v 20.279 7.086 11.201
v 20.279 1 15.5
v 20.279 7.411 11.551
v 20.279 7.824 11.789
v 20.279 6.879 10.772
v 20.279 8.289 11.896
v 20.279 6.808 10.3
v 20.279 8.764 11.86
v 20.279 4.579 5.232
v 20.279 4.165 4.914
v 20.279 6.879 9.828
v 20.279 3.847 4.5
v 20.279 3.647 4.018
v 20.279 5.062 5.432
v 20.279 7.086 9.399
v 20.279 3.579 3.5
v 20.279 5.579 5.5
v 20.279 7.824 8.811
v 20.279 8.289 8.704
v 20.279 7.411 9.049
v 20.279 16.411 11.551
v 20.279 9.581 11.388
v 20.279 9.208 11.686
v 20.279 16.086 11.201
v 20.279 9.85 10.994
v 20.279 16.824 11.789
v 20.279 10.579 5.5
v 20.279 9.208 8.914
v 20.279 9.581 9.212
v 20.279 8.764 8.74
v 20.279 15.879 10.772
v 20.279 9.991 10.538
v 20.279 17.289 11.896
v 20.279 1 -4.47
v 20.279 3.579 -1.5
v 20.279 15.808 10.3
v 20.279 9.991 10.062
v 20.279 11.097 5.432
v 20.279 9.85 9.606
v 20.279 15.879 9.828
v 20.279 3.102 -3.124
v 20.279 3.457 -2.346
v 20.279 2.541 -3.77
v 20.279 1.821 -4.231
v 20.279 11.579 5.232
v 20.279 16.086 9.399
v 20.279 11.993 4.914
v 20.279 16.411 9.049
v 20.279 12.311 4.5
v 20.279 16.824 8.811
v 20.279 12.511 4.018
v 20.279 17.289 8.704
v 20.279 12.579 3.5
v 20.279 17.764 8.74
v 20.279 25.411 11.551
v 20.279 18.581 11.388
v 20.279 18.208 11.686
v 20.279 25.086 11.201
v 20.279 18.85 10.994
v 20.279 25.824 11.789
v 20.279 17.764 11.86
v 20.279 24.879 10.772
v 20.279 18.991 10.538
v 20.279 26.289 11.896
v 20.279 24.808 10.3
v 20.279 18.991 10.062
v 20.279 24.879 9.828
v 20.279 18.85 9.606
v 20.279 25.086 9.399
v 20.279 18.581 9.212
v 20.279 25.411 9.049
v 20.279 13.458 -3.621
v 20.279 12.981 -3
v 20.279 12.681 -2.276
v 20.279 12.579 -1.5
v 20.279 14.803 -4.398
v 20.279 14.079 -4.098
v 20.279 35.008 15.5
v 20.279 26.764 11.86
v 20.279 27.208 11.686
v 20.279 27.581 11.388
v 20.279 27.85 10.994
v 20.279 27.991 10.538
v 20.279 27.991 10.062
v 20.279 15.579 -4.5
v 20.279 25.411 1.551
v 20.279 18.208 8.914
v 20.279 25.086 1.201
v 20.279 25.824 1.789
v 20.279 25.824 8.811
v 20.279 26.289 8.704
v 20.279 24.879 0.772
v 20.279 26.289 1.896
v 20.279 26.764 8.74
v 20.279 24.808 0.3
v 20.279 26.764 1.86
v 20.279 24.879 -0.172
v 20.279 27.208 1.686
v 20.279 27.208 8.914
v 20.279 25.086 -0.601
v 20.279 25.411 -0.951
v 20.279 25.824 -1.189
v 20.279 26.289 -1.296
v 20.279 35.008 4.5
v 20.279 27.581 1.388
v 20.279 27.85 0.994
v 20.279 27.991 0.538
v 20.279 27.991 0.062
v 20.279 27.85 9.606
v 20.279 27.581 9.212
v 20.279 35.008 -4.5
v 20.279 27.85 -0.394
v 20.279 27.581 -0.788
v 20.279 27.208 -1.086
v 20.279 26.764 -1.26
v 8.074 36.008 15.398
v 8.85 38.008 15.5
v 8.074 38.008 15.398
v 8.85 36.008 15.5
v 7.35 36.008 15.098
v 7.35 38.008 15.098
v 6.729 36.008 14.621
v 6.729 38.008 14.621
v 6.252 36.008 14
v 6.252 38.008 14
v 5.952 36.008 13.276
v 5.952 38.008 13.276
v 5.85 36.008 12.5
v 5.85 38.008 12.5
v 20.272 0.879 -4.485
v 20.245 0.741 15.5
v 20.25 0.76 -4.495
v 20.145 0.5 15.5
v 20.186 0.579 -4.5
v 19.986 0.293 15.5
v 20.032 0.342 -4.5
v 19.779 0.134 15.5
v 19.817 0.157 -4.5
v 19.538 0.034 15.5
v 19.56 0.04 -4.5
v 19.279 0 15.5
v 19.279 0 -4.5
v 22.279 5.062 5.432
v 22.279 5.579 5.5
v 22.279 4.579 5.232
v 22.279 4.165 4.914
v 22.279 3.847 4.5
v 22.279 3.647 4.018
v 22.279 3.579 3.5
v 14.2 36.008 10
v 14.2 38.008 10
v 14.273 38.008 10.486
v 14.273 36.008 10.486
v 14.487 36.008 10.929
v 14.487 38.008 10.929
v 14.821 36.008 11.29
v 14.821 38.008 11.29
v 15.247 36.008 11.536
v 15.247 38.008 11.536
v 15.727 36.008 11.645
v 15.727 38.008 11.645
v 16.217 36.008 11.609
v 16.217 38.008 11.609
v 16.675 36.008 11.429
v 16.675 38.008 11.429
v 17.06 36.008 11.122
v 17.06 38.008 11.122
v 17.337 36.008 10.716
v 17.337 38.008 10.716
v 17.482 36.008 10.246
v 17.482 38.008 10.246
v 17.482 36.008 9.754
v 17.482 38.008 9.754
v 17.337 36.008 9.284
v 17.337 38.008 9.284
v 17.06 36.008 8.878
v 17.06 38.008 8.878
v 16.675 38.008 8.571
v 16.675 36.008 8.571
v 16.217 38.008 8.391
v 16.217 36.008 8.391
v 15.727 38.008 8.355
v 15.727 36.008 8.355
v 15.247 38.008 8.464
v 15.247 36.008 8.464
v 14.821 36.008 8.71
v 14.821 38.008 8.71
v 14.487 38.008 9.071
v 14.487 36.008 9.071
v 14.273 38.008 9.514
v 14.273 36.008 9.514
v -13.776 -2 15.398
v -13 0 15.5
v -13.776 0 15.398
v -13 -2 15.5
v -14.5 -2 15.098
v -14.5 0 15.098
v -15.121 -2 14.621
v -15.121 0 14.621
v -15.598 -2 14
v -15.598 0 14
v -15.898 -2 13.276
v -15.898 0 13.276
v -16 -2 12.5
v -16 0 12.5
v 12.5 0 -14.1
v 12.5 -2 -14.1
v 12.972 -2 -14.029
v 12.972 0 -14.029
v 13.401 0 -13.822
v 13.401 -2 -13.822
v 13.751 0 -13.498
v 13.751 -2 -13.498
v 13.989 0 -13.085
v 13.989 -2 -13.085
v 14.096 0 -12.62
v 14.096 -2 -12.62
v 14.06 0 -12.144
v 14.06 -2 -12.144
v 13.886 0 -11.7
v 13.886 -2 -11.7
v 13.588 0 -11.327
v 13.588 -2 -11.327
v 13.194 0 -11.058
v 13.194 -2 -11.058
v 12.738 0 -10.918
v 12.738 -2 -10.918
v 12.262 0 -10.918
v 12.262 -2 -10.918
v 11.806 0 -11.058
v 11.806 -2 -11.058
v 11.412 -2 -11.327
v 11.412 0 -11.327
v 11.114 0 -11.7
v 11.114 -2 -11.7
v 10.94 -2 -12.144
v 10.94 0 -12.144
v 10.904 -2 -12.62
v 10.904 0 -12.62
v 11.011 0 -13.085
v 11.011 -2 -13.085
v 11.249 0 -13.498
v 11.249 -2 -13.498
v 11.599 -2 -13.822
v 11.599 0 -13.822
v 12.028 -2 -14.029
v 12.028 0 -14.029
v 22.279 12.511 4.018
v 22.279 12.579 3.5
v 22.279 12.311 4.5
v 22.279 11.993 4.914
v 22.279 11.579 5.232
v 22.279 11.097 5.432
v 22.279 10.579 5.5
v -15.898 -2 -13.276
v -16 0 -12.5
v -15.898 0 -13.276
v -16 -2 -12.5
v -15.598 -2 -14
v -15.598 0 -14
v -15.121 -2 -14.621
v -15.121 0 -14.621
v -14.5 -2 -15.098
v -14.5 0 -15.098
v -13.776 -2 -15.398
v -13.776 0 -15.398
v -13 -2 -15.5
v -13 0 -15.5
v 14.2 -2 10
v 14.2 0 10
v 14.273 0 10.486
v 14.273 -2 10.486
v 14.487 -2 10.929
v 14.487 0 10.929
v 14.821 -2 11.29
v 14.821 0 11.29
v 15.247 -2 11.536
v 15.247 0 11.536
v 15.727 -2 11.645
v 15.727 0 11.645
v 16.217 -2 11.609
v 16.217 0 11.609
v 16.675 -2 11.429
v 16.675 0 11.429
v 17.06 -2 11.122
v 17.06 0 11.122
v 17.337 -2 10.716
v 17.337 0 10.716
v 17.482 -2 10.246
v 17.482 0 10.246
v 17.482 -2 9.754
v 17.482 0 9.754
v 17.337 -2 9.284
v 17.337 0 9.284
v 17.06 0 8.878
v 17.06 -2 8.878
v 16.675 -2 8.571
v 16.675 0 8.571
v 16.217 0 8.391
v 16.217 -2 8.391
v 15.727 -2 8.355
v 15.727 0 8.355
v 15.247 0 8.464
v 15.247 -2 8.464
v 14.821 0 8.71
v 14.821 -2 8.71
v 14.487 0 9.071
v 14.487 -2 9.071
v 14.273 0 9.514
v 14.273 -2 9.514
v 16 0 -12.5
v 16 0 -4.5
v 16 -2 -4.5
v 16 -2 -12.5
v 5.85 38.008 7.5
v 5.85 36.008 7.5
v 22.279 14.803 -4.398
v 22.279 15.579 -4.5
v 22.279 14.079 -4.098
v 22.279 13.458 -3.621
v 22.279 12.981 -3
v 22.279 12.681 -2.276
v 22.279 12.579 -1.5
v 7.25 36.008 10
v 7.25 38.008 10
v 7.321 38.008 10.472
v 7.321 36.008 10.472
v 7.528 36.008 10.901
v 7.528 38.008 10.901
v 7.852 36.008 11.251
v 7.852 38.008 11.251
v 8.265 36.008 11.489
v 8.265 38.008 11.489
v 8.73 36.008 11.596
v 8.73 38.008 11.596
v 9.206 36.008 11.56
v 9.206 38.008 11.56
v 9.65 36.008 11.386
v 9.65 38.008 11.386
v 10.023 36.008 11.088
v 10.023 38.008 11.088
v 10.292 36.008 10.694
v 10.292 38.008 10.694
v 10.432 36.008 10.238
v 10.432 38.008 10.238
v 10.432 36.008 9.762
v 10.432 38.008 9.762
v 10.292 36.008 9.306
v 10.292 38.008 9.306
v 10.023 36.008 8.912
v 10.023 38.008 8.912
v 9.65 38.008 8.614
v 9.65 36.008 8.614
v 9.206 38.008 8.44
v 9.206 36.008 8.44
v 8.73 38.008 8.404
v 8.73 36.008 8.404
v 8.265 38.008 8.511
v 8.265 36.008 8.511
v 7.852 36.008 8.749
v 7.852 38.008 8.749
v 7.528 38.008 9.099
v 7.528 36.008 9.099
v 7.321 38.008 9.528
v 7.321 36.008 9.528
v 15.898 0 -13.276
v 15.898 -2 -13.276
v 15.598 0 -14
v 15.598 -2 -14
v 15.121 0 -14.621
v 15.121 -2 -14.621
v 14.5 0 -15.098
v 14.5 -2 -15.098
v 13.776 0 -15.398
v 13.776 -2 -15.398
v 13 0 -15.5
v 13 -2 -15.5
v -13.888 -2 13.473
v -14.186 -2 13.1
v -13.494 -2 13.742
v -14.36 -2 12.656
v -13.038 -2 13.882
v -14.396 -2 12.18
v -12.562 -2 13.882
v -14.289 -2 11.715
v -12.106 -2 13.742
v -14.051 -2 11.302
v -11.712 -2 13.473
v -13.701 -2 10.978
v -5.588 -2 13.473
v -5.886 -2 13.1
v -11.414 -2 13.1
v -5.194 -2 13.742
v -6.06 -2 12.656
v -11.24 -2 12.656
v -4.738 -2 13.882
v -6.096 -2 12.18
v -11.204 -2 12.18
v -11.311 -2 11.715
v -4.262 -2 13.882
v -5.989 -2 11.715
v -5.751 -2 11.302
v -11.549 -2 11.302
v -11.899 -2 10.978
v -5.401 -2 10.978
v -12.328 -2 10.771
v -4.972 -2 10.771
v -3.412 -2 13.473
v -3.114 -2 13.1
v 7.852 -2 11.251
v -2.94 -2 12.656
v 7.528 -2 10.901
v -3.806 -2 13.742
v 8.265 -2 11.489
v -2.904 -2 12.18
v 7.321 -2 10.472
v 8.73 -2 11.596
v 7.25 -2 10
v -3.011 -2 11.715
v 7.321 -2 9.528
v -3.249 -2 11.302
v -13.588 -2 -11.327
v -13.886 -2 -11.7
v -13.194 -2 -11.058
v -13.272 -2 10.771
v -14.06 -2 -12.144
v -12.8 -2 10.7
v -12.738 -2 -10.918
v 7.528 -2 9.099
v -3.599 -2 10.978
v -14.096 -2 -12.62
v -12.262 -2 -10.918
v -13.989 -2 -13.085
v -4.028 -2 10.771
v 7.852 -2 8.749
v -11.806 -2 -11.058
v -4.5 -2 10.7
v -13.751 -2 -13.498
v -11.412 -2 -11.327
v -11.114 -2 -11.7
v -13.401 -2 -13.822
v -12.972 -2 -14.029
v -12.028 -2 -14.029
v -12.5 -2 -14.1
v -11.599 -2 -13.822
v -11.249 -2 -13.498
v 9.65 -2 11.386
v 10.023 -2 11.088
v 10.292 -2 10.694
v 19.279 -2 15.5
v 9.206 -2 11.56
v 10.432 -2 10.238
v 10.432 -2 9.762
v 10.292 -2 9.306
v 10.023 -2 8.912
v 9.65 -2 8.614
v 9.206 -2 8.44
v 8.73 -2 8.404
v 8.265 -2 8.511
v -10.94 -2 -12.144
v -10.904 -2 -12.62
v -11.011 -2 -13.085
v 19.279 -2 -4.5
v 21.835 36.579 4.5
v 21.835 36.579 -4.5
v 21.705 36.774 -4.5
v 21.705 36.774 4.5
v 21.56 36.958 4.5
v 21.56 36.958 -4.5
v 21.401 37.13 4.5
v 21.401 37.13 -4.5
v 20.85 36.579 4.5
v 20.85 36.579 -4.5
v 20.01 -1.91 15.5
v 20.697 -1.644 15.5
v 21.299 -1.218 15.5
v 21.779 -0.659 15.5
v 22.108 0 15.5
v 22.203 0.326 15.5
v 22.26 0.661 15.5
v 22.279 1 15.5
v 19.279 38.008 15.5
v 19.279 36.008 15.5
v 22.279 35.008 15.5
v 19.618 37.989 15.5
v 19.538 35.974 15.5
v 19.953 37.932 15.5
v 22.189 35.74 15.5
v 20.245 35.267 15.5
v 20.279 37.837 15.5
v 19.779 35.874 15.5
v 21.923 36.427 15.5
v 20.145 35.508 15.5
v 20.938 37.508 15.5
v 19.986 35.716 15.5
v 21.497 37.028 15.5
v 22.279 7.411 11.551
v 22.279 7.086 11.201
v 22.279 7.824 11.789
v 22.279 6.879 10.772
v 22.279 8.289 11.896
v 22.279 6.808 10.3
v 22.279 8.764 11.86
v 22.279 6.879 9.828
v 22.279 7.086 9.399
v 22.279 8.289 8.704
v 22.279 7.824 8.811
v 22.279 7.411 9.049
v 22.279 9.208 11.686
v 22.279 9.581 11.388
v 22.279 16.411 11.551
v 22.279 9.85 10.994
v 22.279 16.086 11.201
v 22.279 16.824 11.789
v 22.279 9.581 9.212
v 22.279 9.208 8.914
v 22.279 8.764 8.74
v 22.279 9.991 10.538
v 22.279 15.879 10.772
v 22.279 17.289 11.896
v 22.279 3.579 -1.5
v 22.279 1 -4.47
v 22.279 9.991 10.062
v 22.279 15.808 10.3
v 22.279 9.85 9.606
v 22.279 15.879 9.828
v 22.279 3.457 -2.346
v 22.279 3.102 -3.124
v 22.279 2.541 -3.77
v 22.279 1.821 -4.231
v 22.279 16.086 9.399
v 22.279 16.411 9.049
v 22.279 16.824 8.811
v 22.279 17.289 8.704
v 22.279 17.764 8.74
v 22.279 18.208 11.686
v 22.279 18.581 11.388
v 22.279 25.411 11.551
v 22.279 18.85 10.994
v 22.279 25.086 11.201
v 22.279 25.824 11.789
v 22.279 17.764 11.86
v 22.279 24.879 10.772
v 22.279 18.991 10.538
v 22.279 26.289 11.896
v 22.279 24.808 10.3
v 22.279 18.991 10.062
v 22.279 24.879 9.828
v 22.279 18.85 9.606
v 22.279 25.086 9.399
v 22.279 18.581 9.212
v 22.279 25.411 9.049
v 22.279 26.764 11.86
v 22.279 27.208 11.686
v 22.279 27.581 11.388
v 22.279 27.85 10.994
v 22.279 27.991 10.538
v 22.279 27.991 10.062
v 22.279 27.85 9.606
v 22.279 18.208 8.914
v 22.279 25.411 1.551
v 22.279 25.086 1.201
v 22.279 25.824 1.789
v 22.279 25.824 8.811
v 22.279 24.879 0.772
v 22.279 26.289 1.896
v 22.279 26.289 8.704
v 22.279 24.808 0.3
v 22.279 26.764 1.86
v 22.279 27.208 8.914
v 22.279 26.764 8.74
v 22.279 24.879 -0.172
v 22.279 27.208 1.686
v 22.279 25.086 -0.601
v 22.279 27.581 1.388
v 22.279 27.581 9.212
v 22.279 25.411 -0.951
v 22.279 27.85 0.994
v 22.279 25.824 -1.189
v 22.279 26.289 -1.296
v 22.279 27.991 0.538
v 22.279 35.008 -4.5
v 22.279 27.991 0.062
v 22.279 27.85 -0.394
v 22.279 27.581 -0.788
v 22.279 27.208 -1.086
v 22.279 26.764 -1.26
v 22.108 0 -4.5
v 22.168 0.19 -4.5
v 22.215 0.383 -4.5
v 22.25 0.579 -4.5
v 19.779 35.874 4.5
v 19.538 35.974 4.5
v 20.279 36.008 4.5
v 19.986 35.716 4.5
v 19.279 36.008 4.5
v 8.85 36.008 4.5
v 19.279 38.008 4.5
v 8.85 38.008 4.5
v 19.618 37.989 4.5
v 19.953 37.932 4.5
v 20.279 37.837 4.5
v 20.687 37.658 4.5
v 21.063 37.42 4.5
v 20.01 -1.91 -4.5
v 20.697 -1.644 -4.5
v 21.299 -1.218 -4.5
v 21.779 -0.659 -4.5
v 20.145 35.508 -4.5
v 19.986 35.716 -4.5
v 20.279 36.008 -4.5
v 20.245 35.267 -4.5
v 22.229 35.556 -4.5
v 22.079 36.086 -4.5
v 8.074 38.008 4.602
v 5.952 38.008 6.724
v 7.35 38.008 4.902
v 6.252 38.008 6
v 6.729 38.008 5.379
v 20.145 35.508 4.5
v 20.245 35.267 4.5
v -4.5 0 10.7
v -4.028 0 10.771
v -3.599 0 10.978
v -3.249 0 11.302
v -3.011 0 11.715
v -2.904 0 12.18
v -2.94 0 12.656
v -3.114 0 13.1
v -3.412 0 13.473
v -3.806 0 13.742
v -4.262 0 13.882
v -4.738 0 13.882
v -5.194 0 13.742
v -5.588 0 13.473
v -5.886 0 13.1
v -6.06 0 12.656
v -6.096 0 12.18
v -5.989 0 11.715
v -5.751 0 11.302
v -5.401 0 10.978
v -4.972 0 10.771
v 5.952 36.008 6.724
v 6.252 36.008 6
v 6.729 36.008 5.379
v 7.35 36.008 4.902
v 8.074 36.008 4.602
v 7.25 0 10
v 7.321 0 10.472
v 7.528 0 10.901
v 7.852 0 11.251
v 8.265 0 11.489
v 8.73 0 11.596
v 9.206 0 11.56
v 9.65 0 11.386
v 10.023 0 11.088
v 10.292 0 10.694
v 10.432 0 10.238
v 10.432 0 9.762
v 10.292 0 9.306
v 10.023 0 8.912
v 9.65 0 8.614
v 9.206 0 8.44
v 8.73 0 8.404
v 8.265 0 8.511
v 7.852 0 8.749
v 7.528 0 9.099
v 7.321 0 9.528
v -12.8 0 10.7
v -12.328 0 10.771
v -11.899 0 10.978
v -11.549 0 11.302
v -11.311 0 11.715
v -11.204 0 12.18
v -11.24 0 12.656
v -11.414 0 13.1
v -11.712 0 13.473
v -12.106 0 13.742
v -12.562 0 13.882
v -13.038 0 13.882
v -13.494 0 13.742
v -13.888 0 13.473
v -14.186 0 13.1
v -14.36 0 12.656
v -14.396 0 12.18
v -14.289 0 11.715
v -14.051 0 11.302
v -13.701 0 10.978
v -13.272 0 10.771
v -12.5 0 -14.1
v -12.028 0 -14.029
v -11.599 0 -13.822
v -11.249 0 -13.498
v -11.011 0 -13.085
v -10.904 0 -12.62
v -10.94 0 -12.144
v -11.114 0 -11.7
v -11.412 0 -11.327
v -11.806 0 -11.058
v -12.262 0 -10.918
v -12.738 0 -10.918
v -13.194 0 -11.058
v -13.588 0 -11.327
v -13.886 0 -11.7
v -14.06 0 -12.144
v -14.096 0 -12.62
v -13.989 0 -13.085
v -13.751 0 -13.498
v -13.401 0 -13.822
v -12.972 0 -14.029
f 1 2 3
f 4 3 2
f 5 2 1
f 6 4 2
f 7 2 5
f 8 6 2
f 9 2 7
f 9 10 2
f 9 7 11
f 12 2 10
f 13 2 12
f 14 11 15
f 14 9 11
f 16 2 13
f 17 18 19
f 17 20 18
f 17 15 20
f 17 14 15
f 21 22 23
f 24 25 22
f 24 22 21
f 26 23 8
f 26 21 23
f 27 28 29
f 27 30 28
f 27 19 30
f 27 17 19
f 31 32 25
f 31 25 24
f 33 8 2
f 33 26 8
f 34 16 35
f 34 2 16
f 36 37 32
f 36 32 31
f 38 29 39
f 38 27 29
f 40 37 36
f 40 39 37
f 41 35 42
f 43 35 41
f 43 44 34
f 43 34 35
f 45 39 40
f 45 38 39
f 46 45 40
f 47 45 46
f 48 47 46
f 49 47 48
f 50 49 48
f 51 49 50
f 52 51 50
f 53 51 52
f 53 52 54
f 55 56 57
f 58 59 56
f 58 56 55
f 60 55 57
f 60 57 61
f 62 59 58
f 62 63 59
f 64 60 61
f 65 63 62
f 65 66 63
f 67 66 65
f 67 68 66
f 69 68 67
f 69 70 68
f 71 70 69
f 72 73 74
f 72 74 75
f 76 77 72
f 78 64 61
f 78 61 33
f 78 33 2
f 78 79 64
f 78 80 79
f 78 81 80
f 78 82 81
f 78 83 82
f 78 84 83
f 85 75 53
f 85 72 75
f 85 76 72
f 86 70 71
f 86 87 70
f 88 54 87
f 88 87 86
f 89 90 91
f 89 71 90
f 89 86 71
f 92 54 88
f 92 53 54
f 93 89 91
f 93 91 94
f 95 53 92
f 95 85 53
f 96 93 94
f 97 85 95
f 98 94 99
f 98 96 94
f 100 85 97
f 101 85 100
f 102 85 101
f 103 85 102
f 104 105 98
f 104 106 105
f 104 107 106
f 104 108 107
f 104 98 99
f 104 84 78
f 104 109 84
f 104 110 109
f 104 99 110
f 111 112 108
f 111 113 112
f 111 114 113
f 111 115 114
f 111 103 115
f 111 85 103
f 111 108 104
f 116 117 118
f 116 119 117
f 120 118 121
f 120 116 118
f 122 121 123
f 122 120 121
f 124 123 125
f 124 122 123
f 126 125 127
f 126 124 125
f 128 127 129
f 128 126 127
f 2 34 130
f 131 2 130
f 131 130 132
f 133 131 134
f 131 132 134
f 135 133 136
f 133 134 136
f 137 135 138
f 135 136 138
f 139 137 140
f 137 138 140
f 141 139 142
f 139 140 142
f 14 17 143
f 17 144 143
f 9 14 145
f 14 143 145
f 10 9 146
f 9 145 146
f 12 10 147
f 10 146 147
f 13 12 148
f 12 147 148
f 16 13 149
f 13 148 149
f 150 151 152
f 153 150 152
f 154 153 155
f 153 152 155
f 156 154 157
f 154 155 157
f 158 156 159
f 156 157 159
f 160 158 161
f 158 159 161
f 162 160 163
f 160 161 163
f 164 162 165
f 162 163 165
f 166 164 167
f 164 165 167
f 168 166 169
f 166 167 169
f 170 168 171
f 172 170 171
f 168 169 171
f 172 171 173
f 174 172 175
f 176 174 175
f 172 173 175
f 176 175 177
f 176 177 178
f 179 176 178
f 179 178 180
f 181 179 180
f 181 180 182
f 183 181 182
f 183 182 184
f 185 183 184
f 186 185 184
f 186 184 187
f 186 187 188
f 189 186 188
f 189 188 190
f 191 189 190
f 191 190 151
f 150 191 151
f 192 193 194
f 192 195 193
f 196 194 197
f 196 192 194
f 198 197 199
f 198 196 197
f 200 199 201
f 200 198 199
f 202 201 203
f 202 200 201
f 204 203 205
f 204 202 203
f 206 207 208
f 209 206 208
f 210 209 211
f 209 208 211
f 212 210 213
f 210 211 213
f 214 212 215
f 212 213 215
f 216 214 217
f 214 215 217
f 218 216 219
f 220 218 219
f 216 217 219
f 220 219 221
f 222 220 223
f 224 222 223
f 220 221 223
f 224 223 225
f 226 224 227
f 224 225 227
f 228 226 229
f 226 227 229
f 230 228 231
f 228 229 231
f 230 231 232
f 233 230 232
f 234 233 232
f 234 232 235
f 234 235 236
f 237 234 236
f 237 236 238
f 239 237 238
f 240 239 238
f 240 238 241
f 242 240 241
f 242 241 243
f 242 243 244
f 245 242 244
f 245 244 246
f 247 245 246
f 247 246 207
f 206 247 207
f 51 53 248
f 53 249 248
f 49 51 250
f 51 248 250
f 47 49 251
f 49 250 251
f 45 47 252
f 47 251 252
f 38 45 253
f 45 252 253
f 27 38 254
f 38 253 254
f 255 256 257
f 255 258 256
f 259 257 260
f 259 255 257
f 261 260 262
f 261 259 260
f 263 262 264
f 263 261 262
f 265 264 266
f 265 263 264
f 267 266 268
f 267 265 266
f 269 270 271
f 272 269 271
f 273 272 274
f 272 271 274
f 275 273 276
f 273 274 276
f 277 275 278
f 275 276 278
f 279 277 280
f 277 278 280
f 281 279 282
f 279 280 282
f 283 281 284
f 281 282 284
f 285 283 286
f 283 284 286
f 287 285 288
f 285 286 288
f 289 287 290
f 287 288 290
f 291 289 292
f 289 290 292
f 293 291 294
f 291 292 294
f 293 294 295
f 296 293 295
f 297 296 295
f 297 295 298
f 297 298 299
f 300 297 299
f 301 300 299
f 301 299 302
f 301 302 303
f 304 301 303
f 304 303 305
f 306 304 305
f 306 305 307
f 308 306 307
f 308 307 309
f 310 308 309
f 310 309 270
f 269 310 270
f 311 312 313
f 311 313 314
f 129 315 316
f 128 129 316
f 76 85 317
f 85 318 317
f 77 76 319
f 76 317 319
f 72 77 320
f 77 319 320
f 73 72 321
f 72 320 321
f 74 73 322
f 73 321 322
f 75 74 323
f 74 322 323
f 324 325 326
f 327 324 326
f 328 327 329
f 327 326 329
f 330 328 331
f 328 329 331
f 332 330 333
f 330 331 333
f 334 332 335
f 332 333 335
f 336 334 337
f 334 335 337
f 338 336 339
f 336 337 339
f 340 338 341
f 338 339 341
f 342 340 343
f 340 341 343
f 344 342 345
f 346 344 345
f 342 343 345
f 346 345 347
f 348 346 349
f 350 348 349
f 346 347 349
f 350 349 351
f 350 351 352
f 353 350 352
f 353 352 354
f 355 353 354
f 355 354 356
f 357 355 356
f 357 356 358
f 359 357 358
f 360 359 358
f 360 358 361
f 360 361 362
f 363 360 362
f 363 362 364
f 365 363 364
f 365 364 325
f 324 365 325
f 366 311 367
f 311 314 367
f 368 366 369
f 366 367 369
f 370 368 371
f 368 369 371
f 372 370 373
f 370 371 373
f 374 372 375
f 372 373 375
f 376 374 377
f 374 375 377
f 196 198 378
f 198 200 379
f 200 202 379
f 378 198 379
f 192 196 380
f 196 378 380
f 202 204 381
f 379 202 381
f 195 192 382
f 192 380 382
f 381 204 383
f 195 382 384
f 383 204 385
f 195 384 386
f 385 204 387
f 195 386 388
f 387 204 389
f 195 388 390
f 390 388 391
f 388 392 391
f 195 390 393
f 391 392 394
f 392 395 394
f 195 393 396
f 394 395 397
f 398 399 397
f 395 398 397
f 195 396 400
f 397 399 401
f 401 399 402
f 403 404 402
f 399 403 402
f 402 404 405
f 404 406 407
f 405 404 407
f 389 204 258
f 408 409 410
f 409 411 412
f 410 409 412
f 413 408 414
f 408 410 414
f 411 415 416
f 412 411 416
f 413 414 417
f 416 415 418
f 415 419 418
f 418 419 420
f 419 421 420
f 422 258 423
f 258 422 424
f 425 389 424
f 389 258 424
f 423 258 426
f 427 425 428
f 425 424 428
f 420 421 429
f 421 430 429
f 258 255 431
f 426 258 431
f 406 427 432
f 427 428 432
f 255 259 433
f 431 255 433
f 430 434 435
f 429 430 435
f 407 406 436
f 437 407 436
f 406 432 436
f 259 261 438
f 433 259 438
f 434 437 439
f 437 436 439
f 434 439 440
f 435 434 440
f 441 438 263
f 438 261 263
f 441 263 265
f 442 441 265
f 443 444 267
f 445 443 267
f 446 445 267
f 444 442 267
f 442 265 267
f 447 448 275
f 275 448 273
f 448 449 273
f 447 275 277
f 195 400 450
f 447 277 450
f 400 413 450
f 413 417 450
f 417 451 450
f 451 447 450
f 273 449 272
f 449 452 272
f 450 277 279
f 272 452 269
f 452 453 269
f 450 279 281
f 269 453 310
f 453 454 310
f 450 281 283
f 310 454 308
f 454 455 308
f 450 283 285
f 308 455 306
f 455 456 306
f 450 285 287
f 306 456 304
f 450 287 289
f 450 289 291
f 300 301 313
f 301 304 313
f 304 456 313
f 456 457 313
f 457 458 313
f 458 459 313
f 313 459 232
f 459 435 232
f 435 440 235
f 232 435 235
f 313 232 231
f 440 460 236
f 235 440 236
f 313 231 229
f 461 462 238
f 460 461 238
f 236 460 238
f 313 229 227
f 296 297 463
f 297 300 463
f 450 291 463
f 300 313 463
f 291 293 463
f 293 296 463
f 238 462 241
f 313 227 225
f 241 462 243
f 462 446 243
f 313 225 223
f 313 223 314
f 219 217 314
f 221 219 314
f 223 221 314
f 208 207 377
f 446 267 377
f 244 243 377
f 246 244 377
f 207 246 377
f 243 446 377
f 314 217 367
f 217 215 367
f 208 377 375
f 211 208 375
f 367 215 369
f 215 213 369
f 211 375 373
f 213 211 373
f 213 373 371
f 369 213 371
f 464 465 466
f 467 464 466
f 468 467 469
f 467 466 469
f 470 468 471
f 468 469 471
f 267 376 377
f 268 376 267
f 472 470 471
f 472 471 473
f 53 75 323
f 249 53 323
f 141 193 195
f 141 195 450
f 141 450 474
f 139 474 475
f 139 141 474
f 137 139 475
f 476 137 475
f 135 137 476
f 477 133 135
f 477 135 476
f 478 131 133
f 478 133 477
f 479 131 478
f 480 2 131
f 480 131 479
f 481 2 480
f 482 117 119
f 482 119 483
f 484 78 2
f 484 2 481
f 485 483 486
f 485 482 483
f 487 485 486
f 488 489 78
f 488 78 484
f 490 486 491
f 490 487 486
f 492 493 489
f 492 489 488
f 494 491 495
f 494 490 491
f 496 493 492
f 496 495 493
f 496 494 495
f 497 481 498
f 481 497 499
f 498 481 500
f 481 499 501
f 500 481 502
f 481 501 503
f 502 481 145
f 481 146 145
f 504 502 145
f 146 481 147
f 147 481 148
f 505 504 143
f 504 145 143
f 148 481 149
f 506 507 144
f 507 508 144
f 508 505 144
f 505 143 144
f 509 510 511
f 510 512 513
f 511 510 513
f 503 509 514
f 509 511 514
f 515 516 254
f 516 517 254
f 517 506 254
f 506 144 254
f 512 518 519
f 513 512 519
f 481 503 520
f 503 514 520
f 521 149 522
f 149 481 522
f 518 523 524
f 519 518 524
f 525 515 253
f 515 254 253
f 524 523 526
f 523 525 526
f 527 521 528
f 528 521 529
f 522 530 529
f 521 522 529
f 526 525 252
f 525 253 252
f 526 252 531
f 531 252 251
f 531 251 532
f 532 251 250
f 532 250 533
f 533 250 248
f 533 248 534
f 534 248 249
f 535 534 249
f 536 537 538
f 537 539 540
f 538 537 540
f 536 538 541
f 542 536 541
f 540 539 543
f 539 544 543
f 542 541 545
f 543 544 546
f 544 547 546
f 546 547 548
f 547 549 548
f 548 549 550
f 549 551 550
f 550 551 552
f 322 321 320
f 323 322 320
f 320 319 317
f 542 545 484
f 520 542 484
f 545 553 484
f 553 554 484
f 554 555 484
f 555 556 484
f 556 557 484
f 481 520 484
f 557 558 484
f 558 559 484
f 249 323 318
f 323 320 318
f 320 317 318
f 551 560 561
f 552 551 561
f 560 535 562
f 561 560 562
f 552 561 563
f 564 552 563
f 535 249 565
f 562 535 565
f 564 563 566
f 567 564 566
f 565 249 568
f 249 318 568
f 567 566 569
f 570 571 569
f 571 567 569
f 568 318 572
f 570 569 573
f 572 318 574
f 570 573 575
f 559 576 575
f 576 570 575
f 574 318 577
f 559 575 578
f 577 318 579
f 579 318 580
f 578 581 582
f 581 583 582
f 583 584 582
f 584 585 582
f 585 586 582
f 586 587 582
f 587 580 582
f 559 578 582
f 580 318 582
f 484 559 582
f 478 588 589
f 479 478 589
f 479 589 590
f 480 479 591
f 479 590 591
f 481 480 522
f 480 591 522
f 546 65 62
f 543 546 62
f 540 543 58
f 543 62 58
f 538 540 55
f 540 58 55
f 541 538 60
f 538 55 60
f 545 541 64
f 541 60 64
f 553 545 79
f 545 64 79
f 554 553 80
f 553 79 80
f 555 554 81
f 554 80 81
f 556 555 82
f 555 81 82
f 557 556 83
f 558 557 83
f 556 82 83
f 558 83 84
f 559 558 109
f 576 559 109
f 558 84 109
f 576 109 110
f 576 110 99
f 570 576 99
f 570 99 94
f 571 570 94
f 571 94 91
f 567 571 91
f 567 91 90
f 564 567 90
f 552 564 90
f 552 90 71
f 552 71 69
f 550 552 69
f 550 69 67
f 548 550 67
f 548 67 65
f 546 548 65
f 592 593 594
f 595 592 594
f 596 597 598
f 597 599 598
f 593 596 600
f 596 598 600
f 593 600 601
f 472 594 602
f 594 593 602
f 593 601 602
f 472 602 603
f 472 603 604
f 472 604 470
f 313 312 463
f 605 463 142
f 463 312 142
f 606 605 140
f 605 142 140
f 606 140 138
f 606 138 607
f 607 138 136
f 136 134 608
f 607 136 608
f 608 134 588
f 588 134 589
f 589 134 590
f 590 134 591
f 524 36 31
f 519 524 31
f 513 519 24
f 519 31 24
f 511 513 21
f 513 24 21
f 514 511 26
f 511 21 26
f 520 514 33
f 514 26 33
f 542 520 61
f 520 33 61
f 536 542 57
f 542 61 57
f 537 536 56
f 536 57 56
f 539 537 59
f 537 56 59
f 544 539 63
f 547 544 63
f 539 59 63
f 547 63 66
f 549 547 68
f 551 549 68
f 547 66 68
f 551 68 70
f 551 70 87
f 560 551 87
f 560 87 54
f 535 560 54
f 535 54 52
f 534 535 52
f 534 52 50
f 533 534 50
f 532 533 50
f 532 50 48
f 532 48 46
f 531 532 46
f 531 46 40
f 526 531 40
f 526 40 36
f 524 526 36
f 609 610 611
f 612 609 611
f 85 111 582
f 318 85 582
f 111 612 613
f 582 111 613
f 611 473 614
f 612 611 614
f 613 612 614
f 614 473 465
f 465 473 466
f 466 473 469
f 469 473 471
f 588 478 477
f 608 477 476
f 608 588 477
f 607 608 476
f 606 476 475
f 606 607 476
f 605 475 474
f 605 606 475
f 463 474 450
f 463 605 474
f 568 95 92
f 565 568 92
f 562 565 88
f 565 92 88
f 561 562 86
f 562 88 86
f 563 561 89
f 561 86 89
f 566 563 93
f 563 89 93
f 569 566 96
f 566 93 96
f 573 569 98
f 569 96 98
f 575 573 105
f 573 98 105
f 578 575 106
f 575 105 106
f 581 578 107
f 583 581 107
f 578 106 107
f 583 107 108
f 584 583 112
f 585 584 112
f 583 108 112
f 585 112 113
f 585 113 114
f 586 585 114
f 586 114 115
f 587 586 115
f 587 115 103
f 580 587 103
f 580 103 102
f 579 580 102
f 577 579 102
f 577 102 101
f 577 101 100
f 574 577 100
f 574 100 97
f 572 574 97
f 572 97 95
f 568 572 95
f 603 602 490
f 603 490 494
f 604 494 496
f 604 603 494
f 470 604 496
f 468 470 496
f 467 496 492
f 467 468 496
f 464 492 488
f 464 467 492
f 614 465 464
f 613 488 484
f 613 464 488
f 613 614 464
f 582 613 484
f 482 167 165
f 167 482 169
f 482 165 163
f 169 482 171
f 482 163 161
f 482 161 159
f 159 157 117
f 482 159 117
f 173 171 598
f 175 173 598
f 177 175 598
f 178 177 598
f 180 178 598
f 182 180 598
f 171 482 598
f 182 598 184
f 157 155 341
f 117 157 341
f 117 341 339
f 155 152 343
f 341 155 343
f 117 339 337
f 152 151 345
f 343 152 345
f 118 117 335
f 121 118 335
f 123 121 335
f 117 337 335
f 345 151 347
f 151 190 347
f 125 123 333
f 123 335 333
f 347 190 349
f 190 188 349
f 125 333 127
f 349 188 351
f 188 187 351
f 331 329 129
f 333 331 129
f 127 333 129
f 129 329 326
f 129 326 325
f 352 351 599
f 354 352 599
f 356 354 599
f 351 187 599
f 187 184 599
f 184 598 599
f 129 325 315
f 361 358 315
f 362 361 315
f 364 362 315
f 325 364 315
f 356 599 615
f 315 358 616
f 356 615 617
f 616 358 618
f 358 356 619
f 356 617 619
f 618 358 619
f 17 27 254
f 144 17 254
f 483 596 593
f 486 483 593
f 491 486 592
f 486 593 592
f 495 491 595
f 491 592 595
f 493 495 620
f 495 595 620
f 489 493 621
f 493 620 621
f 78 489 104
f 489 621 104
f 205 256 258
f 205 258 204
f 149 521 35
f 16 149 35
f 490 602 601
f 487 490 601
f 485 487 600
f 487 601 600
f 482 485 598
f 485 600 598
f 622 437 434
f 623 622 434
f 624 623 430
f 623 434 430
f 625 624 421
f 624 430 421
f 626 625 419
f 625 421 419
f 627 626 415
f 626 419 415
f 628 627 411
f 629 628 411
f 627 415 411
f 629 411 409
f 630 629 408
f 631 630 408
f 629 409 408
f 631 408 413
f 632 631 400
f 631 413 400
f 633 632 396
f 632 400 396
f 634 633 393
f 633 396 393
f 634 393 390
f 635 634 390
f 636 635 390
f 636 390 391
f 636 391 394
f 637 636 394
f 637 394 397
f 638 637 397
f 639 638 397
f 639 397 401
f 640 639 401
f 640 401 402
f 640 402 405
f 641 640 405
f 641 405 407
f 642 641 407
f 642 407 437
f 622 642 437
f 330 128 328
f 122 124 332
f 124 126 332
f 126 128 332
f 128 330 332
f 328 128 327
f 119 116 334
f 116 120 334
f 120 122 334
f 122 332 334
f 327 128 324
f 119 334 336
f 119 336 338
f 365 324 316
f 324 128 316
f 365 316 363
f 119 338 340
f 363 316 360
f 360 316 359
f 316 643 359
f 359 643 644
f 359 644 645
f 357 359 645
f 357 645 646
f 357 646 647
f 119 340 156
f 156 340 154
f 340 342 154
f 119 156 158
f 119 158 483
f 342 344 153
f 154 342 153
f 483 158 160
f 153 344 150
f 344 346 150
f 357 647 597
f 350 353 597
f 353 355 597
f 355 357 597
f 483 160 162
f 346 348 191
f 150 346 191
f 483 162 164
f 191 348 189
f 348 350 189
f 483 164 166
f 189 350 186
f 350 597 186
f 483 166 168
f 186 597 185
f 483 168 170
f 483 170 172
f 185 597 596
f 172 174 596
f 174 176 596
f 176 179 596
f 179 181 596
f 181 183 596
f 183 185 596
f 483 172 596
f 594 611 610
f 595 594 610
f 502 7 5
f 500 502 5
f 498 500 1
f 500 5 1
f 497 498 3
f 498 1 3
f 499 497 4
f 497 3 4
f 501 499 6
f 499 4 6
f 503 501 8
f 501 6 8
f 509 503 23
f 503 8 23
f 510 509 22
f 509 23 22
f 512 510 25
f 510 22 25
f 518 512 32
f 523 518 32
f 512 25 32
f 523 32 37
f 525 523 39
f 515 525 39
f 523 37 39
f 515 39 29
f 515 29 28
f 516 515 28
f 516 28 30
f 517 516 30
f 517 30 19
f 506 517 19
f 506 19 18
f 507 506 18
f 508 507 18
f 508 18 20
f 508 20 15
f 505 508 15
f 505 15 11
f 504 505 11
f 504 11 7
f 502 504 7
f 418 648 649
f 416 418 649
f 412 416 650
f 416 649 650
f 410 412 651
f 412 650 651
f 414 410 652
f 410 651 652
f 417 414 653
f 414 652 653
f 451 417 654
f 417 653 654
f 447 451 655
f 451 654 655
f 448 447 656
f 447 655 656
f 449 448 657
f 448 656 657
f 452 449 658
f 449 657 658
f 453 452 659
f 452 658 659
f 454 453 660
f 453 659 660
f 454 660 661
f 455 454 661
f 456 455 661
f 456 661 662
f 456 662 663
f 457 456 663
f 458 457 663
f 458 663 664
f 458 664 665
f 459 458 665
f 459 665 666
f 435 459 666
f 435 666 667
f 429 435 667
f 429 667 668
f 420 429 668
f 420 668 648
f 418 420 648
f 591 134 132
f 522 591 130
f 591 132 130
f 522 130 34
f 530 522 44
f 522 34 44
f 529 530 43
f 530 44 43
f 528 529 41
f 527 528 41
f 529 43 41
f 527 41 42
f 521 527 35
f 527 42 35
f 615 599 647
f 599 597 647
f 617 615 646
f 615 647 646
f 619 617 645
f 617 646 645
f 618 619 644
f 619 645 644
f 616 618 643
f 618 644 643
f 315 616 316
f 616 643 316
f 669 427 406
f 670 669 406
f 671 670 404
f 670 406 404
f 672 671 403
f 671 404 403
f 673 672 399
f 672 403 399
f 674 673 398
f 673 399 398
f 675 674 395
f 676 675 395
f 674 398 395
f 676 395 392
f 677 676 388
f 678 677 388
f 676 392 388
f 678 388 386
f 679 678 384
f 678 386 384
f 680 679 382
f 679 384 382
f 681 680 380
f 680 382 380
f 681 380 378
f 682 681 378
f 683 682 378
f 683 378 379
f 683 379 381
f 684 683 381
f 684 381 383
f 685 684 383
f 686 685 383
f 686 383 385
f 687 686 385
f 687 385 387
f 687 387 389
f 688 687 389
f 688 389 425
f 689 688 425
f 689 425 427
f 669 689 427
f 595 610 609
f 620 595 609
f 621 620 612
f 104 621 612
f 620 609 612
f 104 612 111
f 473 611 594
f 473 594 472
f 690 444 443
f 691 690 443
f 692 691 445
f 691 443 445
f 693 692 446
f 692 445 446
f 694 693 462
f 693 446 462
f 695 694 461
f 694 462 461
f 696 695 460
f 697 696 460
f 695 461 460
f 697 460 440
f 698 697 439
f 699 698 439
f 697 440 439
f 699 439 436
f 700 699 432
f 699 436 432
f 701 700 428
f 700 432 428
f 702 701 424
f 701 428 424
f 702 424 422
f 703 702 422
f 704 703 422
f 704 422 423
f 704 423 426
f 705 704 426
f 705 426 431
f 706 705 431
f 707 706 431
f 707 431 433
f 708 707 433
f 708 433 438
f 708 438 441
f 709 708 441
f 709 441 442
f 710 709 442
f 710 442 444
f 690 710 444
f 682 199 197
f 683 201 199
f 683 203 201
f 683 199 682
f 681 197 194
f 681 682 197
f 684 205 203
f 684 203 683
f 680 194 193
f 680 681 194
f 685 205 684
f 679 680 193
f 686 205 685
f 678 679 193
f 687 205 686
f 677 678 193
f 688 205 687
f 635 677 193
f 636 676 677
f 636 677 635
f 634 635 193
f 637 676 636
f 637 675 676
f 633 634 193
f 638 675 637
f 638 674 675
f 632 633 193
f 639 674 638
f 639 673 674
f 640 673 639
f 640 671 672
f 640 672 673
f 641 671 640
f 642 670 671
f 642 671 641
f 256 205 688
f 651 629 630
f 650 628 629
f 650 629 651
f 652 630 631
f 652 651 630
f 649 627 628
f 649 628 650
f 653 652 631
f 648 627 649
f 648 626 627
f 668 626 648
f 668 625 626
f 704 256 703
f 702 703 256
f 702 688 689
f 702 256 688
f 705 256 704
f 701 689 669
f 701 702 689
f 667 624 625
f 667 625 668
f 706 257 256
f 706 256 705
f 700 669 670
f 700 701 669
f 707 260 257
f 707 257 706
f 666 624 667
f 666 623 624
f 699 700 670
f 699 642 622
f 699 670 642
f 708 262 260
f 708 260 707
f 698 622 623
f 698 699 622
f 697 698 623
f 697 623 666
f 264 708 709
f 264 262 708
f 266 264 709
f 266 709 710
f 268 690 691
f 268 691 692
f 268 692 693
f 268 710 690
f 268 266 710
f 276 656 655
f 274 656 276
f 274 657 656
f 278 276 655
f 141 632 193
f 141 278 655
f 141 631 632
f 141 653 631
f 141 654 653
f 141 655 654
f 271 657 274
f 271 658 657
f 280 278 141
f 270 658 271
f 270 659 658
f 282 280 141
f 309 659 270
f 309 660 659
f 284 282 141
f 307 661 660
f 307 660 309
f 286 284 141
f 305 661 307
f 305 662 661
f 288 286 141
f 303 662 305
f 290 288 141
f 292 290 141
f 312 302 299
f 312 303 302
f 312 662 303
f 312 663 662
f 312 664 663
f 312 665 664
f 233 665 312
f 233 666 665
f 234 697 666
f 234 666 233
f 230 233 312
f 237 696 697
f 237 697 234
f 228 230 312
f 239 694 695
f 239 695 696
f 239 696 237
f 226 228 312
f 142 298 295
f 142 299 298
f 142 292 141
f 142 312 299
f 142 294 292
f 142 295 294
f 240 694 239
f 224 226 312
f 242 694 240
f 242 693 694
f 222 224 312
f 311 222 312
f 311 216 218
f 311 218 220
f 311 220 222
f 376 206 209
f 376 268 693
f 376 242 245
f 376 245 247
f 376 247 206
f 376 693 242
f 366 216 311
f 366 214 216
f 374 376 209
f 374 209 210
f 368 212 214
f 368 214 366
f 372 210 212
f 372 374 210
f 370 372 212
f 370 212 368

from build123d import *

# Parameters (mm, degrees)
SM_BASE_FLANGE_1_DEPTH = 2
OTHER_START            = -4.5
OTHER_1_DEPTH          = 20
OTHER_1_2_OUTLINE_W    = 2
OTHER_1_2_OUTLINE_H    = 24
OTHER_1_2_DEPTH        = 20
OTHER_START_2          = 5.5
OTHER_1_3_OUTLINE_W    = 2
OTHER_1_3_OUTLINE_H    = 15
OTHER_1_3_OUTLINE_H_2  = 9
OTHER_1_3_DEPTH        = 10
OTHER_START_3          = 4.5
OTHER_1_4_OUTLINE_W    = 2
OTHER_1_4_OUTLINE_H    = 15
OTHER_1_4_DEPTH        = 1
OTHER_2_DEPTH          = 20
OTHER_2_2_DEPTH        = 9
OTHER_2_3_DEPTH        = 11
OTHER_2_4_DEPTH        = 9
SKETCH_4_R             = 1.6
CUT_EXTRUDE_1_DEPTH    = 10
SKETCH_6_R             = 1.6
CUT_EXTRUDE_2_DEPTH    = 10
CUT_EXTRUDE_3_DEPTH    = 67
SKETCH_10_R            = 1.6
CUT_EXTRUDE_4_DEPTH    = 67
FILLET_1_R             = 3
FILLET_2_R             = 2


# Read off the part's stored shape, not the designer's step: 绘制的折弯1, 绘制的折弯2
# Sheet-metal steps are written as plain solids
with BuildPart() as part:
    # Sketch 1 → 基体-法兰1 (new body)
    with BuildSketch(Plane(origin=(0, 0, 0), x_dir=(1, 0, 0), z_dir=(0, 1, 0))):
        Polygon((-16, -15.5), (16, -15.5), (73, -15.5), (73, -4.5), (58, -4.5), (58, 4.5), (34, 4.5), (34, -5.5), (25, -5.5), (25, 4.5), (16, 4.5), (16, 15.5), (-16, 15.5), align=None)
    extrude(amount=-SM_BASE_FLANGE_1_DEPTH)

    # Other 1 outline → Other 1 (cut)
    with BuildSketch(Plane.XY.offset(OTHER_START)):
        with BuildLine():
            ThreePointArc((22.107630798, 0), (21.011254481, -1.449489743), (19.279203673, -2))
            Line((19.279203673, -2), (73, -2))
            Line((73, -2), (73, 0))
            Line((73, 0), (22.107630798, 0))
        make_face()
    extrude(amount=OTHER_1_DEPTH, mode=Mode.SUBTRACT)

    # Other 1 2 outline → Other 1 2 (add)
    with BuildSketch(Plane.XY.offset(OTHER_START)):
        with Locations((21.279203673, 24.579203673)):
            Rectangle(OTHER_1_2_OUTLINE_W, OTHER_1_2_OUTLINE_H)
        with BuildLine():
            Line((22.279203673, 1), (22.279203673, 3.579203673))
            Line((22.279203673, 3.579203673), (20.279203673, 3.579203673))
            Line((20.279203673, 3.579203673), (20.279203673, 1))
            ThreePointArc((20.279203673, 1), (19.986310454, 0.292893219), (19.279203673, 0))
            Line((19.279203673, 0), (22.107630798, 0))
            ThreePointArc((22.107630798, 0), (22.235999352, 0.492694064), (22.279203673, 1))
        make_face()
    extrude(amount=OTHER_1_2_DEPTH)

    # Other 1 3 outline → Other 1 3 (add)
    with BuildSketch(Plane.XY.offset(OTHER_START_2)):
        with Locations((21.279203673, 44.079203673)):
            Rectangle(OTHER_1_3_OUTLINE_W, OTHER_1_3_OUTLINE_H)
        with Locations((21.279203673, 8.079203673)):
            Rectangle(OTHER_1_3_OUTLINE_W, OTHER_1_3_OUTLINE_H_2)
    extrude(amount=OTHER_1_3_DEPTH)

    # Other 1 4 outline → Other 1 4 (add)
    with BuildSketch(Plane.XY.offset(OTHER_START_3)):
        with Locations((21.279203673, 44.079203673)):
            Rectangle(OTHER_1_4_OUTLINE_W, OTHER_1_4_OUTLINE_H)
    extrude(amount=OTHER_1_4_DEPTH)

    # Other 2 outline → Other 2 (cut)
    with BuildSketch(Plane.XY.offset(OTHER_START)):
        with BuildLine():
            ThreePointArc((20.279203673, 37.836834471), (21.728693416, 36.740458154), (22.279203673, 35.008407346))
            Line((22.279203673, 35.008407346), (22.279203673, 51.579203673))
            Line((22.279203673, 51.579203673), (20.279203673, 51.579203673))
            Line((20.279203673, 51.579203673), (20.279203673, 37.836834471))
        make_face()
    extrude(amount=OTHER_2_DEPTH, mode=Mode.SUBTRACT)

    # Other 2 2 outline → Other 2 2 (cut)
    with BuildSketch(Plane.XY.offset(OTHER_START)):
        Polygon((20.279203673, 36.008407347), (20.85, 36.579203673), (20.279203673, 36.579203673), align=None)
    extrude(amount=OTHER_2_2_DEPTH, mode=Mode.SUBTRACT)

    # Other 2 3 outline → Other 2 3 (add)
    with BuildSketch(Plane.XY.offset(OTHER_START_3)):
        with BuildLine():
            ThreePointArc((20.279203673, 37.836834471), (19.786509609, 37.965203025), (19.279203673, 38.008407346))
            Line((19.279203673, 38.008407346), (5.85, 38.008407346))
            Line((5.85, 38.008407346), (5.85, 36.008407346))
            Line((5.85, 36.008407346), (19.279203673, 36.008407346))
            ThreePointArc((19.279203673, 36.008407346), (19.986310455, 35.715514128), (20.279203673, 35.008407346))
            Line((20.279203673, 35.008407346), (20.279203673, 37.836834471))
        make_face()
    extrude(amount=OTHER_2_3_DEPTH)

    # Other 2 4 outline → Other 2 4 (add)
    with BuildSketch(Plane.XY.offset(OTHER_START)):
        with BuildLine():
            ThreePointArc((21.835098605, 36.579203673), (21.633955222, 36.867209419), (21.400524017, 37.12972769))
            Line((21.400524017, 37.12972769), (20.85, 36.579203673))
            Line((20.85, 36.579203673), (21.835098605, 36.579203673))
        make_face()
        with BuildLine():
            Line((20.279203673, 35.008407346), (20.279203673, 36.008407347))
            Line((20.279203673, 36.008407347), (19.986310454, 35.715514128))
            ThreePointArc((19.986310454, 35.715514128), (20.203083206, 35.391090779), (20.279203673, 35.008407346))
        make_face()
    extrude(amount=OTHER_2_4_DEPTH)

    # 草图4 → 切除-拉伸1 (cut)
    with BuildSketch(Plane(origin=(0, -2, 0), x_dir=(-1, 0, 0), z_dir=(0, -1, 0))):
        with Locations(Location((-12.5, 12.5, 0), (0, 0, 90))):
            Circle(SKETCH_4_R)
        with Locations(Location((12.5, 12.5, 0), (0, 0, 90))):
            Circle(SKETCH_4_R)
    extrude(amount=-CUT_EXTRUDE_1_DEPTH, mode=Mode.SUBTRACT)

    # 草图6 → 切除-拉伸2 (cut)
    with BuildSketch(Plane(origin=(0, -2, 0), x_dir=(-1, 0, 0), z_dir=(0, -1, 0))):
        with Locations(Location((12.8, -12.3, 0), (0, 0, 90))):
            Circle(SKETCH_6_R)
        with Locations(Location((4.5, -12.3, 0), (0, 0, 90))):
            Circle(SKETCH_6_R)
    extrude(amount=-CUT_EXTRUDE_2_DEPTH, mode=Mode.SUBTRACT)

    # 草图8 → 切除-拉伸3 (cut)
    with BuildSketch(Plane(origin=(0, 38.008407346, 0), x_dir=(1, 0, 0), z_dir=(0, 1, 0))):
        with BuildLine():
            Line((7.25, -10), (8.85, -10))
            Line((8.85, -10), (10.45, -10))
            ThreePointArc((10.45, -10), (8.85, -8.4), (7.25, -10))
        make_face()
        with BuildLine():
            Line((10.45, -10), (8.85, -10))
            Line((8.85, -10), (7.25, -10))
            ThreePointArc((7.25, -10), (8.85, -11.6), (10.45, -10))
        make_face()
        with BuildLine():
            ThreePointArc((17.5, -10), (15.85, -8.35), (14.2, -10))
            Line((14.2, -10), (15.85, -10))
            Line((15.85, -10), (17.5, -10))
        make_face()
        with BuildLine():
            Line((15.85, -10), (14.2, -10))
            ThreePointArc((14.2, -10), (15.85, -11.65), (17.5, -10))
            Line((17.5, -10), (15.85, -10))
        make_face()
    extrude(amount=-CUT_EXTRUDE_3_DEPTH, mode=Mode.SUBTRACT)

    # 草图10 → 切除-拉伸4 (cut)
    with BuildSketch(Plane.ZY.offset(-20.279203673)):
        with Locations(Location((10.3, 8.408407346, 0), (0, 0, 270))):
            Circle(SKETCH_10_R)
        with Locations(Location((10.3, 17.408407346, 0), (0, 0, 270))):
            Circle(SKETCH_10_R)
        with Locations(Location((10.3, 26.408407346, 0), (0, 0, 270))):
            Circle(SKETCH_10_R)
        with Locations(Location((0.3, 26.408407346, 0), (0, 0, 270))):
            Circle(SKETCH_10_R)
    extrude(amount=-CUT_EXTRUDE_4_DEPTH, mode=Mode.SUBTRACT)

    # 圆角1
    fillet_1_edges = [part.edges().sort_by_distance(p)[0] for p in [
        (21.279203673, 12.579203673, -4.5),
        (21.279203673, 3.579203673, -4.5),
        (16, -1, -15.5),
        (5.85, 37.008407346, 4.5),
        (5.85, 37.008407346, 15.5),
        (-16, -1, 15.5),
        (-16, -1, -15.5),
    ]]
    fillet(fillet_1_edges, radius=FILLET_1_R)

    # 圆角2
    fillet_2_edges = [part.edges().sort_by_distance(p)[0] for p in [
        (21.279203673, 3.579203673, 5.5),
        (21.279203673, 12.579203673, 5.5),
    ]]
    fillet(fillet_2_edges, radius=FILLET_2_R)


solid = part.part
